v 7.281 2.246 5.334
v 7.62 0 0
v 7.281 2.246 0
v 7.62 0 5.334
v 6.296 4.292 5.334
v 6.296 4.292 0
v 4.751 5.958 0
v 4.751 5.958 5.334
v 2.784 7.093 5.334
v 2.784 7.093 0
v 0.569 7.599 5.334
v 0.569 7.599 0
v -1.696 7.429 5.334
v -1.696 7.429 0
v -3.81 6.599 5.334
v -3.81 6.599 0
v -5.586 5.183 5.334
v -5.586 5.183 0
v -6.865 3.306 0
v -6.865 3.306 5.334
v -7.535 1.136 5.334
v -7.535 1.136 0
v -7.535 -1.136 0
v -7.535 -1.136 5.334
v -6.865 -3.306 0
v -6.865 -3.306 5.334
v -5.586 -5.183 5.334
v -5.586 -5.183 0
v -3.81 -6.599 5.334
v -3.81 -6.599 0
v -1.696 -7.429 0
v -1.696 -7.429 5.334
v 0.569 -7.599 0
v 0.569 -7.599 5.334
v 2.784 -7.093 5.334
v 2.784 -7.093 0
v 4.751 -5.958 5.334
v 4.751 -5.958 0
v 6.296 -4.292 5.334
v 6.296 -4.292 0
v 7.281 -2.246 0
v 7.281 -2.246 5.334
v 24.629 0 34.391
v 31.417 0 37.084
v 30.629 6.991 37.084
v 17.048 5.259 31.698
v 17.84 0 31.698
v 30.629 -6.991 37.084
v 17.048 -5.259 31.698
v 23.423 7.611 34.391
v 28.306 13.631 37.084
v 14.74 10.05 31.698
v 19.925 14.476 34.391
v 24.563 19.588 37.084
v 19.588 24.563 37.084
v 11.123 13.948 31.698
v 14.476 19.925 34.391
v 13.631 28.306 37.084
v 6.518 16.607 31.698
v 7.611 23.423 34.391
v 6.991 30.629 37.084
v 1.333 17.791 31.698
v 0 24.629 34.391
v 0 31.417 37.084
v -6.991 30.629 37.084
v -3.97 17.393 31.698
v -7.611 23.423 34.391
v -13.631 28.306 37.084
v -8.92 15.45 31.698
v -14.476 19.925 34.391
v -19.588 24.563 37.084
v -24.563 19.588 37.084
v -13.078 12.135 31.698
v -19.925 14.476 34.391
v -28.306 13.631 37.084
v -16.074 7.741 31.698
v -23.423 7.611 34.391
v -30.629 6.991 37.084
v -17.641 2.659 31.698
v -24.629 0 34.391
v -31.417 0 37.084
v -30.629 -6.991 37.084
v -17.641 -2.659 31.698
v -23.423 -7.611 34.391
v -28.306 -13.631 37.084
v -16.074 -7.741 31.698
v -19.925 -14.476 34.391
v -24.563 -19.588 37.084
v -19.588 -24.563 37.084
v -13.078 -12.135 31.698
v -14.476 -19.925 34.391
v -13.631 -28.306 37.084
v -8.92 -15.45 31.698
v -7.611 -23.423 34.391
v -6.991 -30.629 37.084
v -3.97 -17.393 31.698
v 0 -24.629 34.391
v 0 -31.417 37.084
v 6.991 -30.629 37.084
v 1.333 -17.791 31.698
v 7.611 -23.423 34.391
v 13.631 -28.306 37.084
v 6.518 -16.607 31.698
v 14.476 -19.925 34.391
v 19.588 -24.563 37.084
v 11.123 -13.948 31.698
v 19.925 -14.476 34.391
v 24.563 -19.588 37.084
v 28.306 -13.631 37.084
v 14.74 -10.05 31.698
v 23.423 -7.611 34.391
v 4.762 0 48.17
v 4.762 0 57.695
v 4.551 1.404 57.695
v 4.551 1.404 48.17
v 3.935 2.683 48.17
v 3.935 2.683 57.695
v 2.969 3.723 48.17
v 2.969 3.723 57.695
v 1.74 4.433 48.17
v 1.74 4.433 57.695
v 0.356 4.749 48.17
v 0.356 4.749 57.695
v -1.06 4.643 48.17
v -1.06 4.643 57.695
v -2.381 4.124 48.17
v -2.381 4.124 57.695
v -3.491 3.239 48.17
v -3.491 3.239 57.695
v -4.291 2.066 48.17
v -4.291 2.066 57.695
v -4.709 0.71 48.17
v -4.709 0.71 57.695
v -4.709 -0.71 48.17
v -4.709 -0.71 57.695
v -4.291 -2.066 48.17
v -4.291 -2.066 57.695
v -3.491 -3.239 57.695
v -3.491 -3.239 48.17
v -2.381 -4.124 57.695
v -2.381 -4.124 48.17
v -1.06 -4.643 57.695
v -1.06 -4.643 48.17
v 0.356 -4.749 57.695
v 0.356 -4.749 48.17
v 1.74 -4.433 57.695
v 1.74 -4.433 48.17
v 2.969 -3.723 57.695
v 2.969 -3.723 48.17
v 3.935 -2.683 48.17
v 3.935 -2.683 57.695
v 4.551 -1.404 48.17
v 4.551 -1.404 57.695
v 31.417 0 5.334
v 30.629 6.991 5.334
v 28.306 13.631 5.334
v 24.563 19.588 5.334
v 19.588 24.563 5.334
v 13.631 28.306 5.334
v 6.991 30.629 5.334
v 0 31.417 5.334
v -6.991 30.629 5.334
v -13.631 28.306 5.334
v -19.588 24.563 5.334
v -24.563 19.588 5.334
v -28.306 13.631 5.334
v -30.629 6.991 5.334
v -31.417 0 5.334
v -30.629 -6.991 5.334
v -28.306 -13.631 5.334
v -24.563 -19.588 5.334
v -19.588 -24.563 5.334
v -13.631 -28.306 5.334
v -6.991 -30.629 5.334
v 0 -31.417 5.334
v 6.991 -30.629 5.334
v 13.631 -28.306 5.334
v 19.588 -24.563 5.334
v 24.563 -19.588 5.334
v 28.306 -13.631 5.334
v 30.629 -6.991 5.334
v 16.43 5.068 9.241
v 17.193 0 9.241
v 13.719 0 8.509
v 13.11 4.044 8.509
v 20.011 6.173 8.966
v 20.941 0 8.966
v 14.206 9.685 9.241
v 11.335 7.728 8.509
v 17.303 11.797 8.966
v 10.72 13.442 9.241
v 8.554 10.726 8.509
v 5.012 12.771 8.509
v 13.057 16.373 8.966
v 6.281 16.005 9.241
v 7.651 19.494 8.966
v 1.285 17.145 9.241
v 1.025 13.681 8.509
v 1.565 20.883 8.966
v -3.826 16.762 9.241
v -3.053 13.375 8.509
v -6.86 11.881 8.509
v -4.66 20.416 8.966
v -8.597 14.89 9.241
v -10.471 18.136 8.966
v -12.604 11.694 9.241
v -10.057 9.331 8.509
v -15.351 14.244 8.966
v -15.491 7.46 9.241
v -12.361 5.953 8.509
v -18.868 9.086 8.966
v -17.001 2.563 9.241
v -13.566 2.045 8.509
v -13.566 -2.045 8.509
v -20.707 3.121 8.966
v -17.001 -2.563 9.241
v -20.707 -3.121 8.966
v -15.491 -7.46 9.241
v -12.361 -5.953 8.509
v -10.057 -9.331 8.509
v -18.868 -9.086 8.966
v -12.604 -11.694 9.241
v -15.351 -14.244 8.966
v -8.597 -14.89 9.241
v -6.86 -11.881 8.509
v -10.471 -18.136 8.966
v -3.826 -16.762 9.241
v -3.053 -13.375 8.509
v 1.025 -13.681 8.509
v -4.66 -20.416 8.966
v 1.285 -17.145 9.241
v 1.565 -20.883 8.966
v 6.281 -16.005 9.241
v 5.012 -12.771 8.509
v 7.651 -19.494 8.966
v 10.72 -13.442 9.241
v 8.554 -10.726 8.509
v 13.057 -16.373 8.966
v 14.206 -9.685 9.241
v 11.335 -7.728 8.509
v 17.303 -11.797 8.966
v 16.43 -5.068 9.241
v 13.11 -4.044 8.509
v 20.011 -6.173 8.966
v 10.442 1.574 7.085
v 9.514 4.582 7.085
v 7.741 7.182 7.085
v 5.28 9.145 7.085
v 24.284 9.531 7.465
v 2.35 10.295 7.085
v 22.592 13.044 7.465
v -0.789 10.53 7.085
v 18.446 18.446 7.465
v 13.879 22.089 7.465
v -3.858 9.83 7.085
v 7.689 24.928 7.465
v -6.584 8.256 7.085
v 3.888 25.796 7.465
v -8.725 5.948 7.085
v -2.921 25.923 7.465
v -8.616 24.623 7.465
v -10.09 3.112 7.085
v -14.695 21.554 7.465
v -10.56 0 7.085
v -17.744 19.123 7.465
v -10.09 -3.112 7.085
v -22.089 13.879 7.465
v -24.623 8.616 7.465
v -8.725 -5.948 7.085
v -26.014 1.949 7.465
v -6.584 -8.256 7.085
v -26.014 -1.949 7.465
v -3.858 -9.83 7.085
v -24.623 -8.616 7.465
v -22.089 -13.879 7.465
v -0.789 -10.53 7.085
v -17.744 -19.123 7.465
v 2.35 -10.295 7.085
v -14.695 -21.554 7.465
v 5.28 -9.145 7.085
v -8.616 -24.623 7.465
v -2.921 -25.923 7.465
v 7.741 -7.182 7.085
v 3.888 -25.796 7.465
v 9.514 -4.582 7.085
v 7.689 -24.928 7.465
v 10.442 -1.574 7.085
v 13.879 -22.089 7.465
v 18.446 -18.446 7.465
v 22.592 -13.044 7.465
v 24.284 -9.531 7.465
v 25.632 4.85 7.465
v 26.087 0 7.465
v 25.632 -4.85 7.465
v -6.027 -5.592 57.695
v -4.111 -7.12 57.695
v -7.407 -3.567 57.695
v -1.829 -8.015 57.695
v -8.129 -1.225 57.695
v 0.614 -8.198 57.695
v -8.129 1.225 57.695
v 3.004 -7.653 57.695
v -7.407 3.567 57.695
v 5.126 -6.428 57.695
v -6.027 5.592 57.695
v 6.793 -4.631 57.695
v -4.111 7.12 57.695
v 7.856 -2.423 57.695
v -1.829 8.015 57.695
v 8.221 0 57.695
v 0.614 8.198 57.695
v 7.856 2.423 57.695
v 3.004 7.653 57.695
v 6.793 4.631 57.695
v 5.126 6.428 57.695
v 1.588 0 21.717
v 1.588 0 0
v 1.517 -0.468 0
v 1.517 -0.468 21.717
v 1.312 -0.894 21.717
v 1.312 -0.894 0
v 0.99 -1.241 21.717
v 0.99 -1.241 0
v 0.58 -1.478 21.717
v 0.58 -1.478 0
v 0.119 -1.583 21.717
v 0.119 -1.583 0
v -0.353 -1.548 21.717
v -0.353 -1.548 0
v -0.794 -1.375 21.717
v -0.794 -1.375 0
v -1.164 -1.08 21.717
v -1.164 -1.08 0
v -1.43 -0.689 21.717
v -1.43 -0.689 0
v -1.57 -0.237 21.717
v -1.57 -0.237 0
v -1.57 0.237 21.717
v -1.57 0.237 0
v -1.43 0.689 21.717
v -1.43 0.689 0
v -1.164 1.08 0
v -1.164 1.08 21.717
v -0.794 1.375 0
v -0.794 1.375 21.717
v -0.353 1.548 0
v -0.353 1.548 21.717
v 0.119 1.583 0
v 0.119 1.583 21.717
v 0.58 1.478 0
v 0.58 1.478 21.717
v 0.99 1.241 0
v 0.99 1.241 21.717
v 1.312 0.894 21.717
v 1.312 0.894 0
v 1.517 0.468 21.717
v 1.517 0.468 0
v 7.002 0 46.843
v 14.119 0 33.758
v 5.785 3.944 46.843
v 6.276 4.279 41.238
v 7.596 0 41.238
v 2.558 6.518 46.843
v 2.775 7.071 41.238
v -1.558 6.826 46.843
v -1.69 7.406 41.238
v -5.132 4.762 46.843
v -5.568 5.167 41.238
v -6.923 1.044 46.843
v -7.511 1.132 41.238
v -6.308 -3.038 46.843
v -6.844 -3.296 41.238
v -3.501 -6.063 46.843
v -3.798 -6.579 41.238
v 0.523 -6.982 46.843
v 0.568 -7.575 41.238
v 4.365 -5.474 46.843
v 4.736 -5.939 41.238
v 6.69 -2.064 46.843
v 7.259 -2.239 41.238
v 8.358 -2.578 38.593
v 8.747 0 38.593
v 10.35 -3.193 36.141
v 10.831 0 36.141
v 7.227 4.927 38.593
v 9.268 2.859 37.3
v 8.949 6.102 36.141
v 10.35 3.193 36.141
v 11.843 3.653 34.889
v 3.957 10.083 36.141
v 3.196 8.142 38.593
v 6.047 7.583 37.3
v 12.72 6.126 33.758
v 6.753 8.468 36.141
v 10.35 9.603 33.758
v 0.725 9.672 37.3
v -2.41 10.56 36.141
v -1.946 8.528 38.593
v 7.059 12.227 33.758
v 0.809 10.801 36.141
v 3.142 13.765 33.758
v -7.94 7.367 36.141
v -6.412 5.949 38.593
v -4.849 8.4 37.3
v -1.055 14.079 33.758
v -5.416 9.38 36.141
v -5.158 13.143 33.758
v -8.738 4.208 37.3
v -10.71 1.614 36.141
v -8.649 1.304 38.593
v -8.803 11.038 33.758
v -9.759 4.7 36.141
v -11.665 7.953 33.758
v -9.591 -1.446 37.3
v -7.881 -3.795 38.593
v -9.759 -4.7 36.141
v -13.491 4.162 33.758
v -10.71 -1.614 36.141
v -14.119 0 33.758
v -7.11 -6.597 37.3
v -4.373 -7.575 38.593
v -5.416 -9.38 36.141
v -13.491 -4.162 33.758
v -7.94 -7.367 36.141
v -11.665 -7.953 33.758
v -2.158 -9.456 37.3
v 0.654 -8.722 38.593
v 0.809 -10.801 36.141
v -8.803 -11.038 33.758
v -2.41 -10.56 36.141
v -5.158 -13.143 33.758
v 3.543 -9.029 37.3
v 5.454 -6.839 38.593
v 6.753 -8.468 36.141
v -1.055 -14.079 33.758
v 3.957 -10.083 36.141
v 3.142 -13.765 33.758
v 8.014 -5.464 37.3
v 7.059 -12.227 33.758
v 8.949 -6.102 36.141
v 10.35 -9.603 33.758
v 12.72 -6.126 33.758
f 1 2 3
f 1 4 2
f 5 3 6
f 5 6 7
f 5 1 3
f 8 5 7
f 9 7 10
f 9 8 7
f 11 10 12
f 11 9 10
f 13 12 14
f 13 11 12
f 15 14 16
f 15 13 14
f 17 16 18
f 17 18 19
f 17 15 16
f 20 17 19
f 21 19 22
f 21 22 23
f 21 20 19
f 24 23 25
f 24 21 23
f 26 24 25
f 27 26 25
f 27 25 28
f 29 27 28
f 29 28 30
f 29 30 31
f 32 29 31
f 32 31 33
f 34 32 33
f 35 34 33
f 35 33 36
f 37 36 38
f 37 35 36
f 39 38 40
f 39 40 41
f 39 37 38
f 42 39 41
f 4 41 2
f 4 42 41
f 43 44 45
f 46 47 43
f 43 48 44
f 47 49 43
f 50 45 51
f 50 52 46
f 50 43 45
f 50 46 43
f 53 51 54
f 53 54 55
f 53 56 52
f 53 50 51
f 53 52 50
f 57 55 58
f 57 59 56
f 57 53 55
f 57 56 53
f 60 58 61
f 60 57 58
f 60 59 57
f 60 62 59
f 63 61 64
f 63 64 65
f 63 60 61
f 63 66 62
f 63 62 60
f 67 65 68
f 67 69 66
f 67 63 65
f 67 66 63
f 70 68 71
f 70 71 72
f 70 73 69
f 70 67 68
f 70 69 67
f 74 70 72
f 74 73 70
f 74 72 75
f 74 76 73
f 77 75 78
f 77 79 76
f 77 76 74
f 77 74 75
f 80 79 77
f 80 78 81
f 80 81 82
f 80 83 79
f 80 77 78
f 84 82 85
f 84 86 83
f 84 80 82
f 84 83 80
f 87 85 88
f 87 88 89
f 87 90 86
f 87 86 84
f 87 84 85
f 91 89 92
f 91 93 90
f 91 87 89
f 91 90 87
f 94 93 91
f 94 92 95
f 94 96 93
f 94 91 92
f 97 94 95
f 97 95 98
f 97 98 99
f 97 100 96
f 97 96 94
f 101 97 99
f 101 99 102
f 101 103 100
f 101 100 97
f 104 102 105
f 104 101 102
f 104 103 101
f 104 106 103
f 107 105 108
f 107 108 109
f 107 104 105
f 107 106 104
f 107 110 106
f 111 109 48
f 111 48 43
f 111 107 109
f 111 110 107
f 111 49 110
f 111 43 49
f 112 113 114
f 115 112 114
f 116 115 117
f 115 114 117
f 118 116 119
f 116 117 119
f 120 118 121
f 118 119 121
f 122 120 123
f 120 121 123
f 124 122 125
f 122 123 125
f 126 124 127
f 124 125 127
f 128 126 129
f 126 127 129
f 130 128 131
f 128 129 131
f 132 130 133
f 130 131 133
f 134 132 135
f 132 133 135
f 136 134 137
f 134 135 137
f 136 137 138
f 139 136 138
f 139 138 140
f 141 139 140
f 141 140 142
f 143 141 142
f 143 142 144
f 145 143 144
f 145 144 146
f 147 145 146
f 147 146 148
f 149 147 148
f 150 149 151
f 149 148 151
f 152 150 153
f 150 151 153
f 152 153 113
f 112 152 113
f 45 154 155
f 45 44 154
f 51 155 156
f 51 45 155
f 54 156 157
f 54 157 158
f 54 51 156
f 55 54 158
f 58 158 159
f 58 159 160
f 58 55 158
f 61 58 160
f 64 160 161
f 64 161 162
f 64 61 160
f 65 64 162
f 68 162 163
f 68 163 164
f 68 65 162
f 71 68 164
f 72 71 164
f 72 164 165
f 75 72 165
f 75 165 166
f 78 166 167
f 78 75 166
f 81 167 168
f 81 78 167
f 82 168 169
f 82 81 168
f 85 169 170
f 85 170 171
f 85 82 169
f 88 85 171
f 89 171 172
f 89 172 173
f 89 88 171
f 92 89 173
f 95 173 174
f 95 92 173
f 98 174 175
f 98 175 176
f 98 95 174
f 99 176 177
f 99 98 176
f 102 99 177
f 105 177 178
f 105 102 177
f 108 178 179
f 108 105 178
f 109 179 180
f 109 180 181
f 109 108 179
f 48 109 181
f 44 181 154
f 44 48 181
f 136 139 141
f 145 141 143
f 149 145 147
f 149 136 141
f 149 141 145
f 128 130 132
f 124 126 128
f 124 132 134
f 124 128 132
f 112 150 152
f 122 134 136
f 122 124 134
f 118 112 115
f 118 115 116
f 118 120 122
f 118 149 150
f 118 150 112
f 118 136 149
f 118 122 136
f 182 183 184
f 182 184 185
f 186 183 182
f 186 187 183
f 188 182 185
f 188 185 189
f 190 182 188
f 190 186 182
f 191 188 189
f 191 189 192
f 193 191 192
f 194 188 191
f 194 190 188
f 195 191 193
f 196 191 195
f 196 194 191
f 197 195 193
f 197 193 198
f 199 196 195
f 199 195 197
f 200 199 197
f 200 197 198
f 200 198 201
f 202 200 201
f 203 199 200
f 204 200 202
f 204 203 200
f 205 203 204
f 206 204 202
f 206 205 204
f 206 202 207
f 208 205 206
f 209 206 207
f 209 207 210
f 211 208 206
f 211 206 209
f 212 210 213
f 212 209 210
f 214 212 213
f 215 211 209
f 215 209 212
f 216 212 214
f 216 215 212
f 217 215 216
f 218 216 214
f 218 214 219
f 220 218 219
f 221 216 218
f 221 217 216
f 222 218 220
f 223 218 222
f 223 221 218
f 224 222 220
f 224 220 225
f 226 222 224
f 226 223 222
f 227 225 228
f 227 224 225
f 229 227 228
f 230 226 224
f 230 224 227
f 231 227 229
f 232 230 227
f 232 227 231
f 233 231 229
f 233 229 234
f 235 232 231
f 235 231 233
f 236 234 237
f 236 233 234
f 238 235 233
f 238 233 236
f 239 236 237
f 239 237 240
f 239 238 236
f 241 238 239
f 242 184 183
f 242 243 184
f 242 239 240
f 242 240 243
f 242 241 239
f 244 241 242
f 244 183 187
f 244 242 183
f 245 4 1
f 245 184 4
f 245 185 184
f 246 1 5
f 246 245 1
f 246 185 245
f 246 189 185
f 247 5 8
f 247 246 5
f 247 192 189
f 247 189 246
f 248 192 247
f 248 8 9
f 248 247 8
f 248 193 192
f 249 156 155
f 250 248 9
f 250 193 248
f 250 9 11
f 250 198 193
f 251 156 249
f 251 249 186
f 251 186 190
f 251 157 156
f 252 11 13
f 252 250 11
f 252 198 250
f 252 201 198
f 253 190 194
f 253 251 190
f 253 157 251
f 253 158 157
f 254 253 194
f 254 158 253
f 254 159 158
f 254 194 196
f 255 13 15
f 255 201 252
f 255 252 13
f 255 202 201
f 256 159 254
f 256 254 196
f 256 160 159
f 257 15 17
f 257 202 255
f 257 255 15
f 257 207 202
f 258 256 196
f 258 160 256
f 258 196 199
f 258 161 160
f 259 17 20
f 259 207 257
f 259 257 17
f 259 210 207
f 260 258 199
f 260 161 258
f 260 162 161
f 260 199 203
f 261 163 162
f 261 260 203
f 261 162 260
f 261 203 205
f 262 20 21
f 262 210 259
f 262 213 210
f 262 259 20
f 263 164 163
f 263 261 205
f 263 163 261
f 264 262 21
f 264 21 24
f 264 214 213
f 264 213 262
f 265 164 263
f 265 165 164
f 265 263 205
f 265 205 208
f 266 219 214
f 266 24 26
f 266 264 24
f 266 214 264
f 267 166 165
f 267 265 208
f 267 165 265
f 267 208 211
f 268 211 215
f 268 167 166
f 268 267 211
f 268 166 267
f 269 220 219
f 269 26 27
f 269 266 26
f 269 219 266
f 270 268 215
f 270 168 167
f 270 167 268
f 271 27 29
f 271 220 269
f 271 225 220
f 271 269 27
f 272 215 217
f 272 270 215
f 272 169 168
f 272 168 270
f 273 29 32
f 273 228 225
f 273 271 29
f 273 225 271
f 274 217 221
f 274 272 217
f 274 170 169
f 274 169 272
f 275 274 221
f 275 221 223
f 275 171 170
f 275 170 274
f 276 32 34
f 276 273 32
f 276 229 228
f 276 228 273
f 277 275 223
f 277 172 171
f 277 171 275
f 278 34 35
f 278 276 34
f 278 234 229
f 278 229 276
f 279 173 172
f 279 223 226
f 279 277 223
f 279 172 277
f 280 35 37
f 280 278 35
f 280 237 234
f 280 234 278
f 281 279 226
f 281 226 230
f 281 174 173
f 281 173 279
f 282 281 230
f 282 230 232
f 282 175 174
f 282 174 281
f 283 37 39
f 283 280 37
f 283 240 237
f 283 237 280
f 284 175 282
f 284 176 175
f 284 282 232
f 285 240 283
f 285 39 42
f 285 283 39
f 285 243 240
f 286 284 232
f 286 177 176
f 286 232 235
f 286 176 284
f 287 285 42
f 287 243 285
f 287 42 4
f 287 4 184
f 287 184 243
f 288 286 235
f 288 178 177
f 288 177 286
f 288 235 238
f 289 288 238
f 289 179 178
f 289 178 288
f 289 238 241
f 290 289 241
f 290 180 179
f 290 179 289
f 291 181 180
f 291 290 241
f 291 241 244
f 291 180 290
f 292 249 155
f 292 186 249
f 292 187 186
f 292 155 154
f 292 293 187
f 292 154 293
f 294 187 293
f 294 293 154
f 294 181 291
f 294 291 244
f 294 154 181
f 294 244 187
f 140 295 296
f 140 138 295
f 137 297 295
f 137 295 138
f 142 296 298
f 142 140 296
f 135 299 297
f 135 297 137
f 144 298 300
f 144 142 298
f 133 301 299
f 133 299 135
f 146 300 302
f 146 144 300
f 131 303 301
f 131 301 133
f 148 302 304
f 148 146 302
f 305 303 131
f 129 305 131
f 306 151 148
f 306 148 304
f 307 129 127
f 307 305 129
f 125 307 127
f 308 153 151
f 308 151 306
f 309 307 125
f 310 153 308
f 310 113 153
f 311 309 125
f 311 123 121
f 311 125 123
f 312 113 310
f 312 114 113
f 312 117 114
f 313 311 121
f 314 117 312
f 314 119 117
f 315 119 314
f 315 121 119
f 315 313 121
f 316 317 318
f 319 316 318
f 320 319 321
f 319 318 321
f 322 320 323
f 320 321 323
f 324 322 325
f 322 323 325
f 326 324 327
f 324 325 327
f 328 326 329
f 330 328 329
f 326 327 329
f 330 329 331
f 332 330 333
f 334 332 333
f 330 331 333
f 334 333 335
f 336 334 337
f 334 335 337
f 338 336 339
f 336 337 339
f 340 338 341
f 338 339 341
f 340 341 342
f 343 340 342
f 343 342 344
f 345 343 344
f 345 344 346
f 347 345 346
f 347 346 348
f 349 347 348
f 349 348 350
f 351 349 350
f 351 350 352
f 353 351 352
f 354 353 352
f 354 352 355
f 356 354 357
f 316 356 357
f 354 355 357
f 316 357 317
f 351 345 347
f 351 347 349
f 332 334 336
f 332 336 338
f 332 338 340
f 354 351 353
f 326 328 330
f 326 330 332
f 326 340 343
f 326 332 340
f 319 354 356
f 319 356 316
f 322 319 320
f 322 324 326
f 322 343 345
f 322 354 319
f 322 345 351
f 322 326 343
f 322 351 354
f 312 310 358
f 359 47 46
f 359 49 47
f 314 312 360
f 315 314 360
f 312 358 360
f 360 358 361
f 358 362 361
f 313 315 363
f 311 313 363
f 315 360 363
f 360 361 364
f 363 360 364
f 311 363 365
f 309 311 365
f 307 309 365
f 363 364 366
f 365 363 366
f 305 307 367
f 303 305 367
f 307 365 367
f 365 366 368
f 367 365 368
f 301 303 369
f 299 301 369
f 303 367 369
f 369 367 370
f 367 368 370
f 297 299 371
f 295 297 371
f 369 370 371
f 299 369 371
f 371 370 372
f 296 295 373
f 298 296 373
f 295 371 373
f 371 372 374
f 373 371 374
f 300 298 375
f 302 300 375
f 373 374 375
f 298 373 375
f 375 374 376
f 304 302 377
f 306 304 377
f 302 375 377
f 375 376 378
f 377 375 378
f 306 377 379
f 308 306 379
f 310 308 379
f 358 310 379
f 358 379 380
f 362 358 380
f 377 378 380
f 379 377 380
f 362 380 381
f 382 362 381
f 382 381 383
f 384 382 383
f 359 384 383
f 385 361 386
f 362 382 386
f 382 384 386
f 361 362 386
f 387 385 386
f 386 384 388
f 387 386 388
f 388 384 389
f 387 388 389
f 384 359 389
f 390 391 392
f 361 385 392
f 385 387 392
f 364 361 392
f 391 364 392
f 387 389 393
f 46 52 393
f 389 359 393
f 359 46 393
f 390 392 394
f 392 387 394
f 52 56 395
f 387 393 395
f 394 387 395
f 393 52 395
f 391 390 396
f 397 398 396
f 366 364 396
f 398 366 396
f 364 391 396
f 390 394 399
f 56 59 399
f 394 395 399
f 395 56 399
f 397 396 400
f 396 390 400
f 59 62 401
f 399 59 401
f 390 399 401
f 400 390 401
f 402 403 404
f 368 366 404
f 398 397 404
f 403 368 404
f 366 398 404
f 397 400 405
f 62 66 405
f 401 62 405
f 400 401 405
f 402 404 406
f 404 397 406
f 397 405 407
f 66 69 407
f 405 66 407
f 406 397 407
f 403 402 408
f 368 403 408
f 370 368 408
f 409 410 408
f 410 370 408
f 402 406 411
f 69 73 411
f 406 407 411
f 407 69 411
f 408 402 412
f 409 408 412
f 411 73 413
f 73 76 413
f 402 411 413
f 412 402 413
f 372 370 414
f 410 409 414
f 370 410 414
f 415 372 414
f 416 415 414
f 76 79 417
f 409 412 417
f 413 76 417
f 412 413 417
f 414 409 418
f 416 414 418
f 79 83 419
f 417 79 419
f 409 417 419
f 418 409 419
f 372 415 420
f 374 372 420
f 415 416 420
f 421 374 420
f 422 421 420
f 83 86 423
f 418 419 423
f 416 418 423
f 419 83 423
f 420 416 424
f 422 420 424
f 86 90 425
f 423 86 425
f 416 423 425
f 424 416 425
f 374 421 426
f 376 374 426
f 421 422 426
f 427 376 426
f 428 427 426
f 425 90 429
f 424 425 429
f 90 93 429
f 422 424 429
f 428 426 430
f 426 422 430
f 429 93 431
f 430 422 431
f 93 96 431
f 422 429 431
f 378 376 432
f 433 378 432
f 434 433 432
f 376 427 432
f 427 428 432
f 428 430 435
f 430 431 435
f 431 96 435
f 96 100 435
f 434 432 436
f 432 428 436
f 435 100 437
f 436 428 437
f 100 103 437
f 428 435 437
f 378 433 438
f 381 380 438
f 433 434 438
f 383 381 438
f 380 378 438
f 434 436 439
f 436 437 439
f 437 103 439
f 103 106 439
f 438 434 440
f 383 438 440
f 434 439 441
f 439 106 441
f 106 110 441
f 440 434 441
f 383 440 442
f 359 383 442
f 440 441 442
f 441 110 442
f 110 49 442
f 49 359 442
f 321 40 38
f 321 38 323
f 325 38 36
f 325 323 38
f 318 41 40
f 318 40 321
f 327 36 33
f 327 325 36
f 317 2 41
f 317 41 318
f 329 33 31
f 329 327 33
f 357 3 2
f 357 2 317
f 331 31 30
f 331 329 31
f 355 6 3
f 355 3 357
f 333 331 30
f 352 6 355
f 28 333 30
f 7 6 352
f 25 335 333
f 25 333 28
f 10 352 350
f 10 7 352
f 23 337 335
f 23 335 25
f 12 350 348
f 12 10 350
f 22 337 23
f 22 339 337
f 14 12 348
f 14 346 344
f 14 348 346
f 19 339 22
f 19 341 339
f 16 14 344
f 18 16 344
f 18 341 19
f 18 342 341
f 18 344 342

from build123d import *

# Parameters (mm, degrees)
F2_R     = 1.5875
F3_DEPTH = 21.717
F4_R     = 4.7625
F5_DEPTH = 9.525


with BuildPart() as f1:
    # F0 (on Front) → F1 (revolve)
    with BuildSketch(Plane.XZ):
        with BuildLine():
            Line((0, 57.6952844858), (0, 0))
            Line((0, 0), (7.62, 0))
            Line((7.62, 0), (7.62, 5.334))
            add(Edge.make_bspline(
                [(7.62, 5.334), (10.5113989407, 7.1572880683), (17.4669983954, 11.2866916591), (26.5060541886, 7.3539307829), (31.4167737961, 5.334)],
                knots=[0, 0, 0, 0, 0.4582214066, 1, 1, 1, 1], degree=3))
            Line((31.4167737961, 5.334), (31.4167737961, 37.084))
            Line((31.4167737961, 37.084), (17.8404673934, 31.6983275115))
            add(Edge.make_bspline(
                [(8.2212127745, 57.6952844858), (7.1609367505, 50.859872418), (5.223357626, 38.3686423698), (13.9081431845, 33.7772379024), (17.8404673934, 31.6983275115)],
                knots=[0, 0, 0, 0, 0.5472168907, 1, 1, 1, 1], degree=3))
            Line((8.2212127745, 57.6952844858), (0, 57.6952844858))
        make_face()
    revolve(axis=Axis((0, 0, 28.8476422429), (0, 0, 1)))

    # F2 (on face) → F3 (cut)
    with BuildSketch(Plane(origin=(0, 0, 0), x_dir=(1, 0, 0), z_dir=(0, 0, -1))):
        Circle(F2_R)
    extrude(amount=-F3_DEPTH, mode=Mode.SUBTRACT)

    # F4 (on face) → F5 (cut)
    with BuildSketch(Plane.XY.offset(57.6952844858)):
        Circle(F4_R)
    extrude(amount=-F5_DEPTH, mode=Mode.SUBTRACT)


solid = f1.part
